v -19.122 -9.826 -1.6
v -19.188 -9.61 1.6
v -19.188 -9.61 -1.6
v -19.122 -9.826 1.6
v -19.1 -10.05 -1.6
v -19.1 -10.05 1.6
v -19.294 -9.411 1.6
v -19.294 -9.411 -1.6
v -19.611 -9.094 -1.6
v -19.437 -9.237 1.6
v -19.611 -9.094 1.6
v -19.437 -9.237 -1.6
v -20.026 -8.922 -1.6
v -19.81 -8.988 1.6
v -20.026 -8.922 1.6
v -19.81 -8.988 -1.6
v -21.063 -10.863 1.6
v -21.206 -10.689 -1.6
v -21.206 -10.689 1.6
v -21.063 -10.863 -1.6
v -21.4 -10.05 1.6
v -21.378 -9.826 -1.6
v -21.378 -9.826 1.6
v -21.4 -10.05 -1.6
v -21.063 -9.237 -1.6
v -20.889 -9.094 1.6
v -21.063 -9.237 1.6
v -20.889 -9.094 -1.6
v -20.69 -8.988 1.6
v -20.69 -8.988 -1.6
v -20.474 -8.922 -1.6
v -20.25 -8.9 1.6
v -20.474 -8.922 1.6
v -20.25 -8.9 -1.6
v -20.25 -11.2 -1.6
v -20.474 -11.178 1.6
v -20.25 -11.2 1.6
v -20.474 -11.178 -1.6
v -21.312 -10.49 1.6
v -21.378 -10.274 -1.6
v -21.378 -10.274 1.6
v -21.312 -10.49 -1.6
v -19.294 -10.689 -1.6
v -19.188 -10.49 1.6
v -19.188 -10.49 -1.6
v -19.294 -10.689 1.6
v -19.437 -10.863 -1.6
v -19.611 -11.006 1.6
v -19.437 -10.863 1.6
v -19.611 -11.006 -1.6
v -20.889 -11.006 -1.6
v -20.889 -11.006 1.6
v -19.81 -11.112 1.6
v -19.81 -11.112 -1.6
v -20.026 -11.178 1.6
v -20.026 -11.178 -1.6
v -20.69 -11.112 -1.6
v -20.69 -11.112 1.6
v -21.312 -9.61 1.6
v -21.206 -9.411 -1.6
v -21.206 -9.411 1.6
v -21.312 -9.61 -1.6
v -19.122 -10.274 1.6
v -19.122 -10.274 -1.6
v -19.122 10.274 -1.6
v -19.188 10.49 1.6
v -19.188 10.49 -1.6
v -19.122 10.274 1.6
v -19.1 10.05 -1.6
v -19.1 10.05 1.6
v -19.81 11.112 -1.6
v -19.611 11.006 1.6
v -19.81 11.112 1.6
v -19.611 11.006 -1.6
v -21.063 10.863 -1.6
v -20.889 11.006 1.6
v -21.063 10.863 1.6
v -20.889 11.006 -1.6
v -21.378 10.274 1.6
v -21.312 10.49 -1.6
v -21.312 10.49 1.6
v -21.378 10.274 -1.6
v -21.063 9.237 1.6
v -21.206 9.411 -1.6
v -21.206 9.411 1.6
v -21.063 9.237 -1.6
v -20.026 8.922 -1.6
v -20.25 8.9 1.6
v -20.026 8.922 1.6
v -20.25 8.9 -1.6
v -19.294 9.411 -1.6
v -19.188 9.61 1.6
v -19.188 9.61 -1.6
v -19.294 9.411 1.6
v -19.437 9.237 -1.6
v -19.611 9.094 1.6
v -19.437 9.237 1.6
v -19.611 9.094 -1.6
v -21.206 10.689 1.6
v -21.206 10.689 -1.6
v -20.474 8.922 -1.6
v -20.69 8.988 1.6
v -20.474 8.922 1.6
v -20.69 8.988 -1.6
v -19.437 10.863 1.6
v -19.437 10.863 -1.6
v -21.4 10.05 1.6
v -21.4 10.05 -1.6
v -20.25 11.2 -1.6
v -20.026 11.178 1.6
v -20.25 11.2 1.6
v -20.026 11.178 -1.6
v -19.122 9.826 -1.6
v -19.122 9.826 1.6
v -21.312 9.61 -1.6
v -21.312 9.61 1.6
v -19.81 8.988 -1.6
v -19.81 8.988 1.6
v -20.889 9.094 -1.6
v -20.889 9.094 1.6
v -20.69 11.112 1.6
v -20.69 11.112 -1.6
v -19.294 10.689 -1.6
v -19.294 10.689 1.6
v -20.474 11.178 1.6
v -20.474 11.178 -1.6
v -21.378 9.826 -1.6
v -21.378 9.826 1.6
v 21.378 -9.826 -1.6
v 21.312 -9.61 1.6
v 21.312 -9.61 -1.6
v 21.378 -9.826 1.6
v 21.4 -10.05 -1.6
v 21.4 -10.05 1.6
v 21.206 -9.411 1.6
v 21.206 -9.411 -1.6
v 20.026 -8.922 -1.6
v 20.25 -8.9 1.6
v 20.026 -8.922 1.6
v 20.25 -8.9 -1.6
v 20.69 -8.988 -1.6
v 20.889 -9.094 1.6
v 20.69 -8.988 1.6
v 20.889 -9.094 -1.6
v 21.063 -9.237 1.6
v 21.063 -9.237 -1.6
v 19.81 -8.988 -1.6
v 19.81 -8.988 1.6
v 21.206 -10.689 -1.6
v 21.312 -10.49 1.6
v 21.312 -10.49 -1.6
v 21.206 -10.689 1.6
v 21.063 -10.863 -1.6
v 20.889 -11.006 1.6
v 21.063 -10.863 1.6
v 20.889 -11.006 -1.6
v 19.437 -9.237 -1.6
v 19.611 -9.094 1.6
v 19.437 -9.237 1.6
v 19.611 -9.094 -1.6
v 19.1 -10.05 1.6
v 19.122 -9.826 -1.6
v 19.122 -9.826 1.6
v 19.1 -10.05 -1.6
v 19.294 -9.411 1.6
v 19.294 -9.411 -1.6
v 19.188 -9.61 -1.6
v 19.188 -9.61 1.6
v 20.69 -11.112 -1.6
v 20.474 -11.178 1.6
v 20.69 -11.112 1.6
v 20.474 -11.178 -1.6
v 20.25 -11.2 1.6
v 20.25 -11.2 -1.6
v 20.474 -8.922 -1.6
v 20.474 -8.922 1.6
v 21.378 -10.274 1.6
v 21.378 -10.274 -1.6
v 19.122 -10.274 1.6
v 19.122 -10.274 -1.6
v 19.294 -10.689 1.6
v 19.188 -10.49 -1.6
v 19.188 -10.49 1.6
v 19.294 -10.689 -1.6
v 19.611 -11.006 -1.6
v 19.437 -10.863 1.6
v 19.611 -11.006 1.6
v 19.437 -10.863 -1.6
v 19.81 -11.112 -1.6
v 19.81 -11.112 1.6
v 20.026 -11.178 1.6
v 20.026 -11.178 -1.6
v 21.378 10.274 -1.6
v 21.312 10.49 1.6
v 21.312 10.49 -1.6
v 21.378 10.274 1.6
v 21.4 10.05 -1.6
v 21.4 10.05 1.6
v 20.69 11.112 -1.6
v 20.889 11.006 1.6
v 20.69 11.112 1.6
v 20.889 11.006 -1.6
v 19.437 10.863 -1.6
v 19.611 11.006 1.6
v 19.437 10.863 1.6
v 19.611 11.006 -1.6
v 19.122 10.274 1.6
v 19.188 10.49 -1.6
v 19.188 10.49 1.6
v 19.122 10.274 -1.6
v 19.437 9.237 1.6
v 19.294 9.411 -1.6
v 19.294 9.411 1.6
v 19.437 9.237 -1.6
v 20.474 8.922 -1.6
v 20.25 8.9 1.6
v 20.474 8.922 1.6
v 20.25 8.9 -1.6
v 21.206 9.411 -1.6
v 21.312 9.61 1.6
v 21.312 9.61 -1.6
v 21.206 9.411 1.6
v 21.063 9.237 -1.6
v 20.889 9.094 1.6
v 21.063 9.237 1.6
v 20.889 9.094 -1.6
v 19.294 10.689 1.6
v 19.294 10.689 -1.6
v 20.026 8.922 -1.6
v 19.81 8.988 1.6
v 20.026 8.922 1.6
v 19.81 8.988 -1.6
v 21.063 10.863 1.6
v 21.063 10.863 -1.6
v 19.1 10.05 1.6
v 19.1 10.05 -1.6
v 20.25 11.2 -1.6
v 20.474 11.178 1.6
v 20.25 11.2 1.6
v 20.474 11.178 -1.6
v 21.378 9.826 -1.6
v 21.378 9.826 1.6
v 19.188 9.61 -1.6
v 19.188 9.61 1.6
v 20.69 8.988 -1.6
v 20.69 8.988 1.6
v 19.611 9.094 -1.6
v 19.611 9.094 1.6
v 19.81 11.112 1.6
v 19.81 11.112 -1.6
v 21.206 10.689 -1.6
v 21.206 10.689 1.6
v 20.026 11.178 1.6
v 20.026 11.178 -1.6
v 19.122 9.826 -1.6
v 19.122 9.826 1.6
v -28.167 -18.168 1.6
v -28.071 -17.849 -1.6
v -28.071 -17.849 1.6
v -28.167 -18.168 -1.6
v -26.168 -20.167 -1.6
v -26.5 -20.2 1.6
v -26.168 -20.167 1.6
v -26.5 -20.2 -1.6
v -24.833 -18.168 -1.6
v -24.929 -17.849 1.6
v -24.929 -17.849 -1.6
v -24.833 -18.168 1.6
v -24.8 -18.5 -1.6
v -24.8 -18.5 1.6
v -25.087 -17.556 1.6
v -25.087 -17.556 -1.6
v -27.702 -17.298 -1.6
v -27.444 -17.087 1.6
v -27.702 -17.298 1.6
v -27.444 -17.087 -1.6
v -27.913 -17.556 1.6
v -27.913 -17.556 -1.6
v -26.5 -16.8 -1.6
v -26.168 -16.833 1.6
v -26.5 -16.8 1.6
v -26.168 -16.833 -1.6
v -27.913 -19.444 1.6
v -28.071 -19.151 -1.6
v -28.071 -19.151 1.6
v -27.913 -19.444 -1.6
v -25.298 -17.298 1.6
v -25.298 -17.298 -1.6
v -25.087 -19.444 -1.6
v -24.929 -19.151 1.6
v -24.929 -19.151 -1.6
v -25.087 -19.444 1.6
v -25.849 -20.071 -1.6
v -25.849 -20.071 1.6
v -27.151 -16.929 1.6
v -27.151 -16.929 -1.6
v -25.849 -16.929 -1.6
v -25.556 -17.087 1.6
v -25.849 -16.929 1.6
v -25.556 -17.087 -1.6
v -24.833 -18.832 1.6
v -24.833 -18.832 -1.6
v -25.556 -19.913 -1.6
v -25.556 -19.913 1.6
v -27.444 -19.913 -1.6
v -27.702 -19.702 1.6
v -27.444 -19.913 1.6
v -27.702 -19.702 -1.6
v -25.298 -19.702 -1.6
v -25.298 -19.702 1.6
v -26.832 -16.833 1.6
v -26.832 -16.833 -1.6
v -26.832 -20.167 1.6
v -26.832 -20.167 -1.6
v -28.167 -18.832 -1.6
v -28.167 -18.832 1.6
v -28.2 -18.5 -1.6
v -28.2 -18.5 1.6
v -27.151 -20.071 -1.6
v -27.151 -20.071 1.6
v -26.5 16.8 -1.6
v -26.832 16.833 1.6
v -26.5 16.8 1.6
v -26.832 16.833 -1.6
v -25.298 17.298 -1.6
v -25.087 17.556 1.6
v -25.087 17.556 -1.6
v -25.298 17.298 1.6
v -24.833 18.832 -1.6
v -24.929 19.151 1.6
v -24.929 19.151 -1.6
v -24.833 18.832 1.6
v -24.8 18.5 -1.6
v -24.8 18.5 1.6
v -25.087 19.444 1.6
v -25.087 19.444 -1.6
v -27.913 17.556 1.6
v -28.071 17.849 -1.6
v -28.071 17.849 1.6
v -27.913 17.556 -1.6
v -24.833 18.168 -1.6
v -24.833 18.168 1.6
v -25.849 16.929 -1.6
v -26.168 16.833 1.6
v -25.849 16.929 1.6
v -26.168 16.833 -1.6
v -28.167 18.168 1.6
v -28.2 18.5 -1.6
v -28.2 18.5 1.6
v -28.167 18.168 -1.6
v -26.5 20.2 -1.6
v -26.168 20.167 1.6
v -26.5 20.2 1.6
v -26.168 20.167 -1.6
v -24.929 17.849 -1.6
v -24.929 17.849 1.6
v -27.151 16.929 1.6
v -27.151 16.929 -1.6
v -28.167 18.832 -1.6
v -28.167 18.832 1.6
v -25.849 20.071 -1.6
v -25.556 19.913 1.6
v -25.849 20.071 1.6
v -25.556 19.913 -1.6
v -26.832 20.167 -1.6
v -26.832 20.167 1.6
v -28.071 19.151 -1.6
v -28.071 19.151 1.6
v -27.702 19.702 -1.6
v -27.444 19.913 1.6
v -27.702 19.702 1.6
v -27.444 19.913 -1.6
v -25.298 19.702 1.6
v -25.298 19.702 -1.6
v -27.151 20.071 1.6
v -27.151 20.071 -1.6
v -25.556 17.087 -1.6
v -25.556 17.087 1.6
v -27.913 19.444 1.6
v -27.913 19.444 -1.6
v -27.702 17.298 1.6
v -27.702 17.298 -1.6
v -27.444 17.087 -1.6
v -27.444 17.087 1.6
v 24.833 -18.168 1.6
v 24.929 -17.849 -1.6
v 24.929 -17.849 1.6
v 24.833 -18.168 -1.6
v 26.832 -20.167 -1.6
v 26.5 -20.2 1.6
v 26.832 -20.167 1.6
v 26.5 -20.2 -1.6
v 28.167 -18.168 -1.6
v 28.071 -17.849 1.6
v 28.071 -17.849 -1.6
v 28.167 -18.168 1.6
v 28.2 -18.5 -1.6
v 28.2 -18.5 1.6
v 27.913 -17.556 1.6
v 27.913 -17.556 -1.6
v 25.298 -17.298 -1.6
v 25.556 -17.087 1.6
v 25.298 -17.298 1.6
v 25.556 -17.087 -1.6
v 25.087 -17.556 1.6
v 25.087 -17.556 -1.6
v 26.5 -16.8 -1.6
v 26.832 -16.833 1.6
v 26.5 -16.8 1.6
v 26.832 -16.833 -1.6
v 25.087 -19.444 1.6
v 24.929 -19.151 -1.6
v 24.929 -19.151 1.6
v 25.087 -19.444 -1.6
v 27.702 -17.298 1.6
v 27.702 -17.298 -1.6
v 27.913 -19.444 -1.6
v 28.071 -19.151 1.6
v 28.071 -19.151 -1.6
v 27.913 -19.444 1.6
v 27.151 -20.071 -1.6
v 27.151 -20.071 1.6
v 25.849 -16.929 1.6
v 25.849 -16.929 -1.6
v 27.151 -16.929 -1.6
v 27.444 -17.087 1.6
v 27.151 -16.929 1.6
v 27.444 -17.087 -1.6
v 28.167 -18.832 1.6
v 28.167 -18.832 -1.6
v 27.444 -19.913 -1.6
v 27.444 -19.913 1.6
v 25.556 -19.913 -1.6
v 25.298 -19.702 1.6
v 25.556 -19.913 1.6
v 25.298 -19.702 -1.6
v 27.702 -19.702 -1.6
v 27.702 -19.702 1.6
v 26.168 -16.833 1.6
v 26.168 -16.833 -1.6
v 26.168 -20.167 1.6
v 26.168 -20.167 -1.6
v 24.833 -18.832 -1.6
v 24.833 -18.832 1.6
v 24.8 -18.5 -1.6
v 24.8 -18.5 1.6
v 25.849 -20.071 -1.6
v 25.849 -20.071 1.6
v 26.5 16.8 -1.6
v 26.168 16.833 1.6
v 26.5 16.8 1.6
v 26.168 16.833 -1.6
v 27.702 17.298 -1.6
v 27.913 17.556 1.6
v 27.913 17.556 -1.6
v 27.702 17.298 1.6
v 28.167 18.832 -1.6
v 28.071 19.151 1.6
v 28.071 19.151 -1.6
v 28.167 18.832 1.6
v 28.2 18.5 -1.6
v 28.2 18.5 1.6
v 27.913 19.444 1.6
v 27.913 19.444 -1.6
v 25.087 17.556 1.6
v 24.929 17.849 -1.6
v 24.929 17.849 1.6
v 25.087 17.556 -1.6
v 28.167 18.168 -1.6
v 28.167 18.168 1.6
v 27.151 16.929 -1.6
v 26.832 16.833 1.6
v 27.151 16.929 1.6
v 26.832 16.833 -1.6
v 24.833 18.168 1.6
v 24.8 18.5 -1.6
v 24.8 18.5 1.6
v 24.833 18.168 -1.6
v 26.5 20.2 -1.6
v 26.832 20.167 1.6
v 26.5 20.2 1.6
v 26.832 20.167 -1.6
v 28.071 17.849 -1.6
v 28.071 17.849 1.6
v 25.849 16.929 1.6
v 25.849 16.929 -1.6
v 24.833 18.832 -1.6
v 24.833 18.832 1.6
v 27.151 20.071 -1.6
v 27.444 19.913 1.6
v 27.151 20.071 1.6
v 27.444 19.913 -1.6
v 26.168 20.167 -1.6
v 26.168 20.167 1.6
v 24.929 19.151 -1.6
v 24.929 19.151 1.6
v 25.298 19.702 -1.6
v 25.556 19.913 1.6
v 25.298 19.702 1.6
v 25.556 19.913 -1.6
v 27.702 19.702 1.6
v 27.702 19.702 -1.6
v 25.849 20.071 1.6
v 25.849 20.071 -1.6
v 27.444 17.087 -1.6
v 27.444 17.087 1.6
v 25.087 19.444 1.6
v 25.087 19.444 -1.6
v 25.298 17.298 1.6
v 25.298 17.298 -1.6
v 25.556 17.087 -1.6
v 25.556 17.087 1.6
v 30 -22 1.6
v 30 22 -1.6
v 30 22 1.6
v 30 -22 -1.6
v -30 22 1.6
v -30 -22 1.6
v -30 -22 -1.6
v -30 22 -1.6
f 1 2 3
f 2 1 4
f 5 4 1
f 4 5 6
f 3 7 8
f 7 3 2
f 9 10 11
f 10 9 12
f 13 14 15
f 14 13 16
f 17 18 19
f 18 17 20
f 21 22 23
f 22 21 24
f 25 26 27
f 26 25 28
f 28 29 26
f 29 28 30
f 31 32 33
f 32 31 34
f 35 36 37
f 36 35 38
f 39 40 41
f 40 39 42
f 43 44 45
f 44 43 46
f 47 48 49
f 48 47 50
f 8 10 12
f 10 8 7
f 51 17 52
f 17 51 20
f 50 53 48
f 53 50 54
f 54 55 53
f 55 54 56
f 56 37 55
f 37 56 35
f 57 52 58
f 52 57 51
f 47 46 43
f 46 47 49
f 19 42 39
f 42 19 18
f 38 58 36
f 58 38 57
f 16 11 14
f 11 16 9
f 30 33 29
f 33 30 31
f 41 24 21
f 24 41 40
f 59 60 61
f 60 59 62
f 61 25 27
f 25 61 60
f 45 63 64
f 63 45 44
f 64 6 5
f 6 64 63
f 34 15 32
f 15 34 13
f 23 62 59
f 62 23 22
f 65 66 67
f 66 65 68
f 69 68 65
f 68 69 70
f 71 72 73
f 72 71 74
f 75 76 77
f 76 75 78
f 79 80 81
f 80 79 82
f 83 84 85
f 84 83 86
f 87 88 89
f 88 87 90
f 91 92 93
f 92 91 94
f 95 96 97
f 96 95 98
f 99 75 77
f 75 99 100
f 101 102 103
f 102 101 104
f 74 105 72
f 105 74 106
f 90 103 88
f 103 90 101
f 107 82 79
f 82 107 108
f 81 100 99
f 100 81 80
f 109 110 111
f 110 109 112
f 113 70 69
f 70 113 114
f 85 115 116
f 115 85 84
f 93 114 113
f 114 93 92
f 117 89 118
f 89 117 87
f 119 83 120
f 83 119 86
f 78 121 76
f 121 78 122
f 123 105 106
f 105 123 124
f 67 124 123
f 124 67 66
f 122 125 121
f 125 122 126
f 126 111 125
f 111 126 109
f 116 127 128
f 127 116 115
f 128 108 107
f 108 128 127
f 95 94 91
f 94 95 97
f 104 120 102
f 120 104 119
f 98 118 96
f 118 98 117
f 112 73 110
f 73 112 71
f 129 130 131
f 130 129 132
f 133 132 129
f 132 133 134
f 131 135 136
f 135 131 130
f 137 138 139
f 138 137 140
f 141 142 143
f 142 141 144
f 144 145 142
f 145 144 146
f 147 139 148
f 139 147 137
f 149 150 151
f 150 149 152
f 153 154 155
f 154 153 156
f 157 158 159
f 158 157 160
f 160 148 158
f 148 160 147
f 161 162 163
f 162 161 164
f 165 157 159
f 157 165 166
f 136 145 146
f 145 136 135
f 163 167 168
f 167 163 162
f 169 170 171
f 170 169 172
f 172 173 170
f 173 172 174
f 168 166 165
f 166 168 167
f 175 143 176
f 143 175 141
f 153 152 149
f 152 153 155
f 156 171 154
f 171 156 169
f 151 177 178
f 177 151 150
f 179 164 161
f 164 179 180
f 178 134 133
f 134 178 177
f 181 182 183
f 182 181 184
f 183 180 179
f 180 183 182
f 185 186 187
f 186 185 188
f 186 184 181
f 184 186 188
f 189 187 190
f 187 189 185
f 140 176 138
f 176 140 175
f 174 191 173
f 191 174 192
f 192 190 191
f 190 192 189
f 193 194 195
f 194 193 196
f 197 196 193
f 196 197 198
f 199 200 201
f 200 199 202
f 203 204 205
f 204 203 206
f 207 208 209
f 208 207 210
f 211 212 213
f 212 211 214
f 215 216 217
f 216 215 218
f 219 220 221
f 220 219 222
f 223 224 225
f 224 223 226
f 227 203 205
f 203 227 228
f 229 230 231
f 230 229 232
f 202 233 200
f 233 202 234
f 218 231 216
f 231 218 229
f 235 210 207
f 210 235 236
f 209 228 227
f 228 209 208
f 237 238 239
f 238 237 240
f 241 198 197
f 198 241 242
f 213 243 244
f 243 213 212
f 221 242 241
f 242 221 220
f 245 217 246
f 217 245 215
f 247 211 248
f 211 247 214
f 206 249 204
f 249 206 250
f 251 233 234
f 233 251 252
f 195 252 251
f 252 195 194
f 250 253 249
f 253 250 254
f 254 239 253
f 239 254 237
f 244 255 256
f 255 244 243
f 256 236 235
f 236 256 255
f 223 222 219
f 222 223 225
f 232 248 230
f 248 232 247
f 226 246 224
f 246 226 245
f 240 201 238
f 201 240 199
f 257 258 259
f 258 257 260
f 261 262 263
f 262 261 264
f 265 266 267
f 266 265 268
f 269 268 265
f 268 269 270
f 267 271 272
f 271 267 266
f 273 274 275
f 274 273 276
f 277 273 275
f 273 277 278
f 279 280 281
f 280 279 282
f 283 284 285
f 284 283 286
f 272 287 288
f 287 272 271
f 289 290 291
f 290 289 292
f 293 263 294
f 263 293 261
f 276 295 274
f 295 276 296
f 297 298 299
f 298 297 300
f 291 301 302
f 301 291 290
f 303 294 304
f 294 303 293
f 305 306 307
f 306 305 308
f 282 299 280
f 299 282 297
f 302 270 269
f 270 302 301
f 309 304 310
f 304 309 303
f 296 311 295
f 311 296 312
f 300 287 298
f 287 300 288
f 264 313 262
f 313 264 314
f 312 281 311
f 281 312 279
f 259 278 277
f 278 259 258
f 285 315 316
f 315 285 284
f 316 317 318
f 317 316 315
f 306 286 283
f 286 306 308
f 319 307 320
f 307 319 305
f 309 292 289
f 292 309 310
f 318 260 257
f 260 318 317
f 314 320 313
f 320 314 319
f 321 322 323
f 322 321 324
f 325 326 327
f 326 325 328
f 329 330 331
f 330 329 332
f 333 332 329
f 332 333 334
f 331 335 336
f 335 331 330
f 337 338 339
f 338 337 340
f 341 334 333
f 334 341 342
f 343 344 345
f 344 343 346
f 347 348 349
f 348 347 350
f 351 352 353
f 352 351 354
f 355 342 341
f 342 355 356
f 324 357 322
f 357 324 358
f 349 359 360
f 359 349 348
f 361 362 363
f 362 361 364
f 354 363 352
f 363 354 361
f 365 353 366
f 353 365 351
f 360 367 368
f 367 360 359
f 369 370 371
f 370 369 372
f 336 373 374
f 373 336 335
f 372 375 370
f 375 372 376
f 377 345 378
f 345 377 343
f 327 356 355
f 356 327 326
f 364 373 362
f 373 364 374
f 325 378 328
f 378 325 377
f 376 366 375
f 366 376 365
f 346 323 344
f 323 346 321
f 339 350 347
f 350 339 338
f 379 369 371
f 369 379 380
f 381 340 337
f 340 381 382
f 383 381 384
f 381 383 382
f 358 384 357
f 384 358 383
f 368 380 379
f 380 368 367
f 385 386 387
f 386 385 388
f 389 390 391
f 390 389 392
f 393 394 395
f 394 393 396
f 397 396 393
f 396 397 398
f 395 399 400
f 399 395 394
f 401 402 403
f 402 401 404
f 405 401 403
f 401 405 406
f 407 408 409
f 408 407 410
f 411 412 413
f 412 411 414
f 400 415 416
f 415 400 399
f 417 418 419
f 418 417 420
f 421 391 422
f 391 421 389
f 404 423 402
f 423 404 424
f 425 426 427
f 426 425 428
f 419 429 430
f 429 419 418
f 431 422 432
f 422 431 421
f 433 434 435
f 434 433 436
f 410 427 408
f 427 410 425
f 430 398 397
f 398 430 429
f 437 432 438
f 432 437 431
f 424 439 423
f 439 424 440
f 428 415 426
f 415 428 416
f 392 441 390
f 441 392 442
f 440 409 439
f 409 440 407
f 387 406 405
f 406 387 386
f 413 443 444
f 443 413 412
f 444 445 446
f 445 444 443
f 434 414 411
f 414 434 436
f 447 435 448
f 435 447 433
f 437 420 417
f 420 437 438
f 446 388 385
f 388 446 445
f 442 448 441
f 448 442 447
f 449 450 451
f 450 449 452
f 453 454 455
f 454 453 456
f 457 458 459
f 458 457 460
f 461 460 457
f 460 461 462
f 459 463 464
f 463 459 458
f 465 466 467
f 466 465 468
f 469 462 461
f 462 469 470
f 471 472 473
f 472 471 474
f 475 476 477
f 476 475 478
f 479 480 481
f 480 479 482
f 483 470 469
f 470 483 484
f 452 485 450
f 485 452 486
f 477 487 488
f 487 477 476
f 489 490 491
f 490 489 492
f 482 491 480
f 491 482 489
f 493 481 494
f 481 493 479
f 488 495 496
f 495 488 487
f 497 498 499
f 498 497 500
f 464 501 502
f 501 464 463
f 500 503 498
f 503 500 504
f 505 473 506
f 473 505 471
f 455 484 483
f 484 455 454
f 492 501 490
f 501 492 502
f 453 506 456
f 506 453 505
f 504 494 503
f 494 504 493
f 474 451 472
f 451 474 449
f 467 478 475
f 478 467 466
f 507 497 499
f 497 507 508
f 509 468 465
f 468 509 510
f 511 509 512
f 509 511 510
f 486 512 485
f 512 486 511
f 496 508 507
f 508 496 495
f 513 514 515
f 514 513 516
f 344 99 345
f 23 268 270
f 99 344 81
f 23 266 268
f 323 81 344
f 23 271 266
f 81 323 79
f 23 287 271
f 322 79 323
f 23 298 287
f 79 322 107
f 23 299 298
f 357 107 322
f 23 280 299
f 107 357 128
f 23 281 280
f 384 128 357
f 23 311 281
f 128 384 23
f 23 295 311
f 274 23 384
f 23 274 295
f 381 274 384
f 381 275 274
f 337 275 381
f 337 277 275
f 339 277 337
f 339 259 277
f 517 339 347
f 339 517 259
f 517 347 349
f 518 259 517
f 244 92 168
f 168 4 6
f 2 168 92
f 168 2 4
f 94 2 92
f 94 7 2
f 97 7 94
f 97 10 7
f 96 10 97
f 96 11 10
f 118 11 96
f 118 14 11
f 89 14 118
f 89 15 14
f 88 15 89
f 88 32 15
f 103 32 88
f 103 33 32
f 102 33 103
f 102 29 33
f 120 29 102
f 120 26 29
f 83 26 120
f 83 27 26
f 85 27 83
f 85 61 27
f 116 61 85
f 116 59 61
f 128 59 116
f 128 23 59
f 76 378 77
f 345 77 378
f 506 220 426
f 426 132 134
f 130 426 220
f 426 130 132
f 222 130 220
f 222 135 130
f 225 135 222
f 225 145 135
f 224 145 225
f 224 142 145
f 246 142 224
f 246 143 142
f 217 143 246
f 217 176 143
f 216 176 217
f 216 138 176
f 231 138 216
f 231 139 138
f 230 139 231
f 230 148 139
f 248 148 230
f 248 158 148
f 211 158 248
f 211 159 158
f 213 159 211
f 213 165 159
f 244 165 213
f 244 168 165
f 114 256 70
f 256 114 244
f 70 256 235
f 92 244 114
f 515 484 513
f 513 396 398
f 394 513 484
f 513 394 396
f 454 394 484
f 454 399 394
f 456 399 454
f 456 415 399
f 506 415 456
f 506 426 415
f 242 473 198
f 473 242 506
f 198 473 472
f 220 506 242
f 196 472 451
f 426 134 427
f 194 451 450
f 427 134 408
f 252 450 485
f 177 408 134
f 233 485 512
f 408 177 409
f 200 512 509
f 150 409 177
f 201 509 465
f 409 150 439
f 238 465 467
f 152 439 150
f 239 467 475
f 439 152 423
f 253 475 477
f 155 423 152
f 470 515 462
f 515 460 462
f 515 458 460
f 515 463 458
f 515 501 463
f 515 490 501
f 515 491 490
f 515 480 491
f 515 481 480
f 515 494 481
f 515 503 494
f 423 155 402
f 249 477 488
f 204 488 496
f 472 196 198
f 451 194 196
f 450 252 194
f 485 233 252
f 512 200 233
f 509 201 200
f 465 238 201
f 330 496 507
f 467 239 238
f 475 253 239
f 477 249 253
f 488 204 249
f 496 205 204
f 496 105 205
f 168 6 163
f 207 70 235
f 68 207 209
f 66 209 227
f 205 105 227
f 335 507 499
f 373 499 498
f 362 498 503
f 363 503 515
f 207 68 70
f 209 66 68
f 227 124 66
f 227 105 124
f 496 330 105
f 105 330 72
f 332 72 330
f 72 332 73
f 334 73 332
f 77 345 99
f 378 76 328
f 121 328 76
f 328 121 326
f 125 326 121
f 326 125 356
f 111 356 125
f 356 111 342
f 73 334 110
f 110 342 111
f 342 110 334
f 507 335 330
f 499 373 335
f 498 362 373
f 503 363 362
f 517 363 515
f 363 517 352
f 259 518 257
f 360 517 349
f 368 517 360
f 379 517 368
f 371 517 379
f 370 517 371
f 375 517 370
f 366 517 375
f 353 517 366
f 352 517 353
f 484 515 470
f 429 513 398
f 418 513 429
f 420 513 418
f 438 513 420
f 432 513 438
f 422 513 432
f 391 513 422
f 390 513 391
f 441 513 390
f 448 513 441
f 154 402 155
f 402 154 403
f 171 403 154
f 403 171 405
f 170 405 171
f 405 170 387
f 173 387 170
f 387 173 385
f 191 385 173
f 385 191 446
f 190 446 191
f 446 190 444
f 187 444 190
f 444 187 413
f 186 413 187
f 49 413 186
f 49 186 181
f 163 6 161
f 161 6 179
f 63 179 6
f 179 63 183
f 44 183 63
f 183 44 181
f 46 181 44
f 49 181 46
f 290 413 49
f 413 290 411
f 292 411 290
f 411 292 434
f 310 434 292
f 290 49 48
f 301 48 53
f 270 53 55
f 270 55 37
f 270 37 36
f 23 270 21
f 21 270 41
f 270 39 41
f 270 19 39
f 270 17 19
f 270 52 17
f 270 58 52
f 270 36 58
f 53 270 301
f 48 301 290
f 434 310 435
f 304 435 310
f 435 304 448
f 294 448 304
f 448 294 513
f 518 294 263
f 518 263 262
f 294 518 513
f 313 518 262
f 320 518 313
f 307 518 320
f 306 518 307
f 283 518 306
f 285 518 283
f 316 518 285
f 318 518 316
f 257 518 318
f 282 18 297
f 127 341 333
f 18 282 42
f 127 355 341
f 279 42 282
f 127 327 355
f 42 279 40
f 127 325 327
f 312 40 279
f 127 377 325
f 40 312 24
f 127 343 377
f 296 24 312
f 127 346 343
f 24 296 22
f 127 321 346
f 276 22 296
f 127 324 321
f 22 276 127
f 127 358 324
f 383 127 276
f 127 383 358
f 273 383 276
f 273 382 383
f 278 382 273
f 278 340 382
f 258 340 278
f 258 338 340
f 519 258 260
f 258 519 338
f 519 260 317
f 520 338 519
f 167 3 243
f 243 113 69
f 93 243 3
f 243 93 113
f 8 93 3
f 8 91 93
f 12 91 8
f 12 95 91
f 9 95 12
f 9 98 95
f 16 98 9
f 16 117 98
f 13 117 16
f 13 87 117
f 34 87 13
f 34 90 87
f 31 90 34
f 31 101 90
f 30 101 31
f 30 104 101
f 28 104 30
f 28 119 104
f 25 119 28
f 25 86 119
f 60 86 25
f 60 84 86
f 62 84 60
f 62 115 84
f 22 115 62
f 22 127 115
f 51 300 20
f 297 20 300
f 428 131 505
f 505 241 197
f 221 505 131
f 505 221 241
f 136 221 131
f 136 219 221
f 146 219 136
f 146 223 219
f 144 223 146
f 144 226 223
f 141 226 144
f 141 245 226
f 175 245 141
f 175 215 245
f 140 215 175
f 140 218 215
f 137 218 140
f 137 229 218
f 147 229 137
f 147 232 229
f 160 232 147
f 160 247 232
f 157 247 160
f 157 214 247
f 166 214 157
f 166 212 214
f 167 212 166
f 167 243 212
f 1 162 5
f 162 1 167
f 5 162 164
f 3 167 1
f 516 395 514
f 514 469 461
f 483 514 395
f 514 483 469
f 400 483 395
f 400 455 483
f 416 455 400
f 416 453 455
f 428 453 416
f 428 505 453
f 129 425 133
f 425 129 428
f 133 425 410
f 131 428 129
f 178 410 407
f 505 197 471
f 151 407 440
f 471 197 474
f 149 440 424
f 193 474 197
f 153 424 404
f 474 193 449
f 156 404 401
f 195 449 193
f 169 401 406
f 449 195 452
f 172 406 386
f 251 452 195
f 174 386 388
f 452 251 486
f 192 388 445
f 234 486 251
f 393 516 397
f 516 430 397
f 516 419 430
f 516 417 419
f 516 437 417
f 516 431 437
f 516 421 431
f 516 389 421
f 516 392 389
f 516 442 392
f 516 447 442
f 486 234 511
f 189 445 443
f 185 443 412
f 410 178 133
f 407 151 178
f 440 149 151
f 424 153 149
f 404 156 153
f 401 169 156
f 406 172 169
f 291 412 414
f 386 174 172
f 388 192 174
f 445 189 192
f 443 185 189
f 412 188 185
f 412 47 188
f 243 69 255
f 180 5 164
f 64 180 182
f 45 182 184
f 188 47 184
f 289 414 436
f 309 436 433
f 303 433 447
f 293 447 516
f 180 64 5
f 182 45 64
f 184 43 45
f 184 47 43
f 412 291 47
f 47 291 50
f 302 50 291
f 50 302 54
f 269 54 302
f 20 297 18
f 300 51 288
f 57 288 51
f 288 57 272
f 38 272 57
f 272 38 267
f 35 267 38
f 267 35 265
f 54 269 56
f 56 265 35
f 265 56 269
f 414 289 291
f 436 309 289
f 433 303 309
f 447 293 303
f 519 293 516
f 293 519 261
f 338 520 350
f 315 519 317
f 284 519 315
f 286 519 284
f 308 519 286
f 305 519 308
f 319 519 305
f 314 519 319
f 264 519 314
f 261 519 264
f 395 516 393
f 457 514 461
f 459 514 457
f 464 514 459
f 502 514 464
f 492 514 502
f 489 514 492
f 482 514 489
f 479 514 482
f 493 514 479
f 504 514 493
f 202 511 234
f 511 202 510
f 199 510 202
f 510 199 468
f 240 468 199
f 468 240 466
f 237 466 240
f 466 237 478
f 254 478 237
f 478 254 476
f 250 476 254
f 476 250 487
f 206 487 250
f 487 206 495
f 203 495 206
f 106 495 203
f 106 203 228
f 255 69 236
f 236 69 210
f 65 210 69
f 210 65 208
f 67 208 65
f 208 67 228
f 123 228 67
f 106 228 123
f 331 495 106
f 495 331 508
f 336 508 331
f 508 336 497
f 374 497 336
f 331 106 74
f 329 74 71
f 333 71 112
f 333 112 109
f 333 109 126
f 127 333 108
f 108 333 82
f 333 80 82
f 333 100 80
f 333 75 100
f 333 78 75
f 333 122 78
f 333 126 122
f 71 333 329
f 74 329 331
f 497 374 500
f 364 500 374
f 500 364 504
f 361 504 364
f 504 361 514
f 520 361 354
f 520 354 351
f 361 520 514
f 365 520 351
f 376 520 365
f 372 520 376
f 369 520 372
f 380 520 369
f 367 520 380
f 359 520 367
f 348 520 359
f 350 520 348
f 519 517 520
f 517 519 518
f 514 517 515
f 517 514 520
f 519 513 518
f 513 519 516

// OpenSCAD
// Parametric source for the custom-fit parts in this package.
// Units: millimetres. Render one part at a time by setting PART.
PART = "servo_adapter"; // servo_adapter | battery_tray | battery_lid

// FEETECH STS3215-C001 drawing: 45.23 x 24.73 x 35 mm.
// Four case mounting holes are approximately 40.5 x 20.1 mm pitch.
servo_hole_pitch_x = 40.5;
servo_hole_pitch_y = 20.1;
servo_hole_d = 2.3;
frame_hole_pitch_x = 53;
frame_hole_pitch_y = 37;
frame_hole_d = 3.4;
plate_x = 60;
plate_y = 44;
plate_t = 3.2;

battery_x = 105;
battery_y = 33;
battery_z = 25;
clearance = 3;
wall = 3.5;
tray_floor = 2.5;
tray_inner_z = 33;

module servo_adapter() {
  difference() {
    cube([plate_x, plate_y, plate_t], center=true);
    for (x=[-servo_hole_pitch_x/2, servo_hole_pitch_x/2],
         y=[-servo_hole_pitch_y/2, servo_hole_pitch_y/2])
      translate([x,y,0]) cylinder(d=servo_hole_d, h=plate_t+1, center=true, $fn=32);
    for (x=[-frame_hole_pitch_x/2, frame_hole_pitch_x/2],
         y=[-frame_hole_pitch_y/2, frame_hole_pitch_y/2])
      translate([x,y,0]) cylinder(d=frame_hole_d, h=plate_t+1, center=true, $fn=32);
  }
}

module battery_tray() {
  ox = battery_x + 2*clearance + 2*wall;
  oy = battery_y + 2*clearance + 2*wall;
  oz = 35;
  difference() {
    cube([ox,oy,oz]);
    translate([wall,wall,tray_floor])
      cube([111,39,tray_inner_z]);
    // Two fabric straps pass through paired slots in the floor.
    for (x=[-35,35], y=[-17.5,17.5])
      translate([ox/2+x,oy/2+y,1.25]) cube([10,3.4,5],center=true);
  }
}

module battery_lid() {
  ox = battery_x + 2*clearance + 2*wall;
  oy = battery_y + 2*clearance + 2*wall;
  difference() {
    cube([ox,oy,2.4]);
    for (x=[-35,35], y=[-17.5,17.5])
      translate([ox/2+x,oy/2+y,1.2]) cube([10,3.4,4],center=true);
  }
}

if (PART == "servo_adapter") servo_adapter();
if (PART == "battery_tray") battery_tray();
if (PART == "battery_lid") battery_lid();
